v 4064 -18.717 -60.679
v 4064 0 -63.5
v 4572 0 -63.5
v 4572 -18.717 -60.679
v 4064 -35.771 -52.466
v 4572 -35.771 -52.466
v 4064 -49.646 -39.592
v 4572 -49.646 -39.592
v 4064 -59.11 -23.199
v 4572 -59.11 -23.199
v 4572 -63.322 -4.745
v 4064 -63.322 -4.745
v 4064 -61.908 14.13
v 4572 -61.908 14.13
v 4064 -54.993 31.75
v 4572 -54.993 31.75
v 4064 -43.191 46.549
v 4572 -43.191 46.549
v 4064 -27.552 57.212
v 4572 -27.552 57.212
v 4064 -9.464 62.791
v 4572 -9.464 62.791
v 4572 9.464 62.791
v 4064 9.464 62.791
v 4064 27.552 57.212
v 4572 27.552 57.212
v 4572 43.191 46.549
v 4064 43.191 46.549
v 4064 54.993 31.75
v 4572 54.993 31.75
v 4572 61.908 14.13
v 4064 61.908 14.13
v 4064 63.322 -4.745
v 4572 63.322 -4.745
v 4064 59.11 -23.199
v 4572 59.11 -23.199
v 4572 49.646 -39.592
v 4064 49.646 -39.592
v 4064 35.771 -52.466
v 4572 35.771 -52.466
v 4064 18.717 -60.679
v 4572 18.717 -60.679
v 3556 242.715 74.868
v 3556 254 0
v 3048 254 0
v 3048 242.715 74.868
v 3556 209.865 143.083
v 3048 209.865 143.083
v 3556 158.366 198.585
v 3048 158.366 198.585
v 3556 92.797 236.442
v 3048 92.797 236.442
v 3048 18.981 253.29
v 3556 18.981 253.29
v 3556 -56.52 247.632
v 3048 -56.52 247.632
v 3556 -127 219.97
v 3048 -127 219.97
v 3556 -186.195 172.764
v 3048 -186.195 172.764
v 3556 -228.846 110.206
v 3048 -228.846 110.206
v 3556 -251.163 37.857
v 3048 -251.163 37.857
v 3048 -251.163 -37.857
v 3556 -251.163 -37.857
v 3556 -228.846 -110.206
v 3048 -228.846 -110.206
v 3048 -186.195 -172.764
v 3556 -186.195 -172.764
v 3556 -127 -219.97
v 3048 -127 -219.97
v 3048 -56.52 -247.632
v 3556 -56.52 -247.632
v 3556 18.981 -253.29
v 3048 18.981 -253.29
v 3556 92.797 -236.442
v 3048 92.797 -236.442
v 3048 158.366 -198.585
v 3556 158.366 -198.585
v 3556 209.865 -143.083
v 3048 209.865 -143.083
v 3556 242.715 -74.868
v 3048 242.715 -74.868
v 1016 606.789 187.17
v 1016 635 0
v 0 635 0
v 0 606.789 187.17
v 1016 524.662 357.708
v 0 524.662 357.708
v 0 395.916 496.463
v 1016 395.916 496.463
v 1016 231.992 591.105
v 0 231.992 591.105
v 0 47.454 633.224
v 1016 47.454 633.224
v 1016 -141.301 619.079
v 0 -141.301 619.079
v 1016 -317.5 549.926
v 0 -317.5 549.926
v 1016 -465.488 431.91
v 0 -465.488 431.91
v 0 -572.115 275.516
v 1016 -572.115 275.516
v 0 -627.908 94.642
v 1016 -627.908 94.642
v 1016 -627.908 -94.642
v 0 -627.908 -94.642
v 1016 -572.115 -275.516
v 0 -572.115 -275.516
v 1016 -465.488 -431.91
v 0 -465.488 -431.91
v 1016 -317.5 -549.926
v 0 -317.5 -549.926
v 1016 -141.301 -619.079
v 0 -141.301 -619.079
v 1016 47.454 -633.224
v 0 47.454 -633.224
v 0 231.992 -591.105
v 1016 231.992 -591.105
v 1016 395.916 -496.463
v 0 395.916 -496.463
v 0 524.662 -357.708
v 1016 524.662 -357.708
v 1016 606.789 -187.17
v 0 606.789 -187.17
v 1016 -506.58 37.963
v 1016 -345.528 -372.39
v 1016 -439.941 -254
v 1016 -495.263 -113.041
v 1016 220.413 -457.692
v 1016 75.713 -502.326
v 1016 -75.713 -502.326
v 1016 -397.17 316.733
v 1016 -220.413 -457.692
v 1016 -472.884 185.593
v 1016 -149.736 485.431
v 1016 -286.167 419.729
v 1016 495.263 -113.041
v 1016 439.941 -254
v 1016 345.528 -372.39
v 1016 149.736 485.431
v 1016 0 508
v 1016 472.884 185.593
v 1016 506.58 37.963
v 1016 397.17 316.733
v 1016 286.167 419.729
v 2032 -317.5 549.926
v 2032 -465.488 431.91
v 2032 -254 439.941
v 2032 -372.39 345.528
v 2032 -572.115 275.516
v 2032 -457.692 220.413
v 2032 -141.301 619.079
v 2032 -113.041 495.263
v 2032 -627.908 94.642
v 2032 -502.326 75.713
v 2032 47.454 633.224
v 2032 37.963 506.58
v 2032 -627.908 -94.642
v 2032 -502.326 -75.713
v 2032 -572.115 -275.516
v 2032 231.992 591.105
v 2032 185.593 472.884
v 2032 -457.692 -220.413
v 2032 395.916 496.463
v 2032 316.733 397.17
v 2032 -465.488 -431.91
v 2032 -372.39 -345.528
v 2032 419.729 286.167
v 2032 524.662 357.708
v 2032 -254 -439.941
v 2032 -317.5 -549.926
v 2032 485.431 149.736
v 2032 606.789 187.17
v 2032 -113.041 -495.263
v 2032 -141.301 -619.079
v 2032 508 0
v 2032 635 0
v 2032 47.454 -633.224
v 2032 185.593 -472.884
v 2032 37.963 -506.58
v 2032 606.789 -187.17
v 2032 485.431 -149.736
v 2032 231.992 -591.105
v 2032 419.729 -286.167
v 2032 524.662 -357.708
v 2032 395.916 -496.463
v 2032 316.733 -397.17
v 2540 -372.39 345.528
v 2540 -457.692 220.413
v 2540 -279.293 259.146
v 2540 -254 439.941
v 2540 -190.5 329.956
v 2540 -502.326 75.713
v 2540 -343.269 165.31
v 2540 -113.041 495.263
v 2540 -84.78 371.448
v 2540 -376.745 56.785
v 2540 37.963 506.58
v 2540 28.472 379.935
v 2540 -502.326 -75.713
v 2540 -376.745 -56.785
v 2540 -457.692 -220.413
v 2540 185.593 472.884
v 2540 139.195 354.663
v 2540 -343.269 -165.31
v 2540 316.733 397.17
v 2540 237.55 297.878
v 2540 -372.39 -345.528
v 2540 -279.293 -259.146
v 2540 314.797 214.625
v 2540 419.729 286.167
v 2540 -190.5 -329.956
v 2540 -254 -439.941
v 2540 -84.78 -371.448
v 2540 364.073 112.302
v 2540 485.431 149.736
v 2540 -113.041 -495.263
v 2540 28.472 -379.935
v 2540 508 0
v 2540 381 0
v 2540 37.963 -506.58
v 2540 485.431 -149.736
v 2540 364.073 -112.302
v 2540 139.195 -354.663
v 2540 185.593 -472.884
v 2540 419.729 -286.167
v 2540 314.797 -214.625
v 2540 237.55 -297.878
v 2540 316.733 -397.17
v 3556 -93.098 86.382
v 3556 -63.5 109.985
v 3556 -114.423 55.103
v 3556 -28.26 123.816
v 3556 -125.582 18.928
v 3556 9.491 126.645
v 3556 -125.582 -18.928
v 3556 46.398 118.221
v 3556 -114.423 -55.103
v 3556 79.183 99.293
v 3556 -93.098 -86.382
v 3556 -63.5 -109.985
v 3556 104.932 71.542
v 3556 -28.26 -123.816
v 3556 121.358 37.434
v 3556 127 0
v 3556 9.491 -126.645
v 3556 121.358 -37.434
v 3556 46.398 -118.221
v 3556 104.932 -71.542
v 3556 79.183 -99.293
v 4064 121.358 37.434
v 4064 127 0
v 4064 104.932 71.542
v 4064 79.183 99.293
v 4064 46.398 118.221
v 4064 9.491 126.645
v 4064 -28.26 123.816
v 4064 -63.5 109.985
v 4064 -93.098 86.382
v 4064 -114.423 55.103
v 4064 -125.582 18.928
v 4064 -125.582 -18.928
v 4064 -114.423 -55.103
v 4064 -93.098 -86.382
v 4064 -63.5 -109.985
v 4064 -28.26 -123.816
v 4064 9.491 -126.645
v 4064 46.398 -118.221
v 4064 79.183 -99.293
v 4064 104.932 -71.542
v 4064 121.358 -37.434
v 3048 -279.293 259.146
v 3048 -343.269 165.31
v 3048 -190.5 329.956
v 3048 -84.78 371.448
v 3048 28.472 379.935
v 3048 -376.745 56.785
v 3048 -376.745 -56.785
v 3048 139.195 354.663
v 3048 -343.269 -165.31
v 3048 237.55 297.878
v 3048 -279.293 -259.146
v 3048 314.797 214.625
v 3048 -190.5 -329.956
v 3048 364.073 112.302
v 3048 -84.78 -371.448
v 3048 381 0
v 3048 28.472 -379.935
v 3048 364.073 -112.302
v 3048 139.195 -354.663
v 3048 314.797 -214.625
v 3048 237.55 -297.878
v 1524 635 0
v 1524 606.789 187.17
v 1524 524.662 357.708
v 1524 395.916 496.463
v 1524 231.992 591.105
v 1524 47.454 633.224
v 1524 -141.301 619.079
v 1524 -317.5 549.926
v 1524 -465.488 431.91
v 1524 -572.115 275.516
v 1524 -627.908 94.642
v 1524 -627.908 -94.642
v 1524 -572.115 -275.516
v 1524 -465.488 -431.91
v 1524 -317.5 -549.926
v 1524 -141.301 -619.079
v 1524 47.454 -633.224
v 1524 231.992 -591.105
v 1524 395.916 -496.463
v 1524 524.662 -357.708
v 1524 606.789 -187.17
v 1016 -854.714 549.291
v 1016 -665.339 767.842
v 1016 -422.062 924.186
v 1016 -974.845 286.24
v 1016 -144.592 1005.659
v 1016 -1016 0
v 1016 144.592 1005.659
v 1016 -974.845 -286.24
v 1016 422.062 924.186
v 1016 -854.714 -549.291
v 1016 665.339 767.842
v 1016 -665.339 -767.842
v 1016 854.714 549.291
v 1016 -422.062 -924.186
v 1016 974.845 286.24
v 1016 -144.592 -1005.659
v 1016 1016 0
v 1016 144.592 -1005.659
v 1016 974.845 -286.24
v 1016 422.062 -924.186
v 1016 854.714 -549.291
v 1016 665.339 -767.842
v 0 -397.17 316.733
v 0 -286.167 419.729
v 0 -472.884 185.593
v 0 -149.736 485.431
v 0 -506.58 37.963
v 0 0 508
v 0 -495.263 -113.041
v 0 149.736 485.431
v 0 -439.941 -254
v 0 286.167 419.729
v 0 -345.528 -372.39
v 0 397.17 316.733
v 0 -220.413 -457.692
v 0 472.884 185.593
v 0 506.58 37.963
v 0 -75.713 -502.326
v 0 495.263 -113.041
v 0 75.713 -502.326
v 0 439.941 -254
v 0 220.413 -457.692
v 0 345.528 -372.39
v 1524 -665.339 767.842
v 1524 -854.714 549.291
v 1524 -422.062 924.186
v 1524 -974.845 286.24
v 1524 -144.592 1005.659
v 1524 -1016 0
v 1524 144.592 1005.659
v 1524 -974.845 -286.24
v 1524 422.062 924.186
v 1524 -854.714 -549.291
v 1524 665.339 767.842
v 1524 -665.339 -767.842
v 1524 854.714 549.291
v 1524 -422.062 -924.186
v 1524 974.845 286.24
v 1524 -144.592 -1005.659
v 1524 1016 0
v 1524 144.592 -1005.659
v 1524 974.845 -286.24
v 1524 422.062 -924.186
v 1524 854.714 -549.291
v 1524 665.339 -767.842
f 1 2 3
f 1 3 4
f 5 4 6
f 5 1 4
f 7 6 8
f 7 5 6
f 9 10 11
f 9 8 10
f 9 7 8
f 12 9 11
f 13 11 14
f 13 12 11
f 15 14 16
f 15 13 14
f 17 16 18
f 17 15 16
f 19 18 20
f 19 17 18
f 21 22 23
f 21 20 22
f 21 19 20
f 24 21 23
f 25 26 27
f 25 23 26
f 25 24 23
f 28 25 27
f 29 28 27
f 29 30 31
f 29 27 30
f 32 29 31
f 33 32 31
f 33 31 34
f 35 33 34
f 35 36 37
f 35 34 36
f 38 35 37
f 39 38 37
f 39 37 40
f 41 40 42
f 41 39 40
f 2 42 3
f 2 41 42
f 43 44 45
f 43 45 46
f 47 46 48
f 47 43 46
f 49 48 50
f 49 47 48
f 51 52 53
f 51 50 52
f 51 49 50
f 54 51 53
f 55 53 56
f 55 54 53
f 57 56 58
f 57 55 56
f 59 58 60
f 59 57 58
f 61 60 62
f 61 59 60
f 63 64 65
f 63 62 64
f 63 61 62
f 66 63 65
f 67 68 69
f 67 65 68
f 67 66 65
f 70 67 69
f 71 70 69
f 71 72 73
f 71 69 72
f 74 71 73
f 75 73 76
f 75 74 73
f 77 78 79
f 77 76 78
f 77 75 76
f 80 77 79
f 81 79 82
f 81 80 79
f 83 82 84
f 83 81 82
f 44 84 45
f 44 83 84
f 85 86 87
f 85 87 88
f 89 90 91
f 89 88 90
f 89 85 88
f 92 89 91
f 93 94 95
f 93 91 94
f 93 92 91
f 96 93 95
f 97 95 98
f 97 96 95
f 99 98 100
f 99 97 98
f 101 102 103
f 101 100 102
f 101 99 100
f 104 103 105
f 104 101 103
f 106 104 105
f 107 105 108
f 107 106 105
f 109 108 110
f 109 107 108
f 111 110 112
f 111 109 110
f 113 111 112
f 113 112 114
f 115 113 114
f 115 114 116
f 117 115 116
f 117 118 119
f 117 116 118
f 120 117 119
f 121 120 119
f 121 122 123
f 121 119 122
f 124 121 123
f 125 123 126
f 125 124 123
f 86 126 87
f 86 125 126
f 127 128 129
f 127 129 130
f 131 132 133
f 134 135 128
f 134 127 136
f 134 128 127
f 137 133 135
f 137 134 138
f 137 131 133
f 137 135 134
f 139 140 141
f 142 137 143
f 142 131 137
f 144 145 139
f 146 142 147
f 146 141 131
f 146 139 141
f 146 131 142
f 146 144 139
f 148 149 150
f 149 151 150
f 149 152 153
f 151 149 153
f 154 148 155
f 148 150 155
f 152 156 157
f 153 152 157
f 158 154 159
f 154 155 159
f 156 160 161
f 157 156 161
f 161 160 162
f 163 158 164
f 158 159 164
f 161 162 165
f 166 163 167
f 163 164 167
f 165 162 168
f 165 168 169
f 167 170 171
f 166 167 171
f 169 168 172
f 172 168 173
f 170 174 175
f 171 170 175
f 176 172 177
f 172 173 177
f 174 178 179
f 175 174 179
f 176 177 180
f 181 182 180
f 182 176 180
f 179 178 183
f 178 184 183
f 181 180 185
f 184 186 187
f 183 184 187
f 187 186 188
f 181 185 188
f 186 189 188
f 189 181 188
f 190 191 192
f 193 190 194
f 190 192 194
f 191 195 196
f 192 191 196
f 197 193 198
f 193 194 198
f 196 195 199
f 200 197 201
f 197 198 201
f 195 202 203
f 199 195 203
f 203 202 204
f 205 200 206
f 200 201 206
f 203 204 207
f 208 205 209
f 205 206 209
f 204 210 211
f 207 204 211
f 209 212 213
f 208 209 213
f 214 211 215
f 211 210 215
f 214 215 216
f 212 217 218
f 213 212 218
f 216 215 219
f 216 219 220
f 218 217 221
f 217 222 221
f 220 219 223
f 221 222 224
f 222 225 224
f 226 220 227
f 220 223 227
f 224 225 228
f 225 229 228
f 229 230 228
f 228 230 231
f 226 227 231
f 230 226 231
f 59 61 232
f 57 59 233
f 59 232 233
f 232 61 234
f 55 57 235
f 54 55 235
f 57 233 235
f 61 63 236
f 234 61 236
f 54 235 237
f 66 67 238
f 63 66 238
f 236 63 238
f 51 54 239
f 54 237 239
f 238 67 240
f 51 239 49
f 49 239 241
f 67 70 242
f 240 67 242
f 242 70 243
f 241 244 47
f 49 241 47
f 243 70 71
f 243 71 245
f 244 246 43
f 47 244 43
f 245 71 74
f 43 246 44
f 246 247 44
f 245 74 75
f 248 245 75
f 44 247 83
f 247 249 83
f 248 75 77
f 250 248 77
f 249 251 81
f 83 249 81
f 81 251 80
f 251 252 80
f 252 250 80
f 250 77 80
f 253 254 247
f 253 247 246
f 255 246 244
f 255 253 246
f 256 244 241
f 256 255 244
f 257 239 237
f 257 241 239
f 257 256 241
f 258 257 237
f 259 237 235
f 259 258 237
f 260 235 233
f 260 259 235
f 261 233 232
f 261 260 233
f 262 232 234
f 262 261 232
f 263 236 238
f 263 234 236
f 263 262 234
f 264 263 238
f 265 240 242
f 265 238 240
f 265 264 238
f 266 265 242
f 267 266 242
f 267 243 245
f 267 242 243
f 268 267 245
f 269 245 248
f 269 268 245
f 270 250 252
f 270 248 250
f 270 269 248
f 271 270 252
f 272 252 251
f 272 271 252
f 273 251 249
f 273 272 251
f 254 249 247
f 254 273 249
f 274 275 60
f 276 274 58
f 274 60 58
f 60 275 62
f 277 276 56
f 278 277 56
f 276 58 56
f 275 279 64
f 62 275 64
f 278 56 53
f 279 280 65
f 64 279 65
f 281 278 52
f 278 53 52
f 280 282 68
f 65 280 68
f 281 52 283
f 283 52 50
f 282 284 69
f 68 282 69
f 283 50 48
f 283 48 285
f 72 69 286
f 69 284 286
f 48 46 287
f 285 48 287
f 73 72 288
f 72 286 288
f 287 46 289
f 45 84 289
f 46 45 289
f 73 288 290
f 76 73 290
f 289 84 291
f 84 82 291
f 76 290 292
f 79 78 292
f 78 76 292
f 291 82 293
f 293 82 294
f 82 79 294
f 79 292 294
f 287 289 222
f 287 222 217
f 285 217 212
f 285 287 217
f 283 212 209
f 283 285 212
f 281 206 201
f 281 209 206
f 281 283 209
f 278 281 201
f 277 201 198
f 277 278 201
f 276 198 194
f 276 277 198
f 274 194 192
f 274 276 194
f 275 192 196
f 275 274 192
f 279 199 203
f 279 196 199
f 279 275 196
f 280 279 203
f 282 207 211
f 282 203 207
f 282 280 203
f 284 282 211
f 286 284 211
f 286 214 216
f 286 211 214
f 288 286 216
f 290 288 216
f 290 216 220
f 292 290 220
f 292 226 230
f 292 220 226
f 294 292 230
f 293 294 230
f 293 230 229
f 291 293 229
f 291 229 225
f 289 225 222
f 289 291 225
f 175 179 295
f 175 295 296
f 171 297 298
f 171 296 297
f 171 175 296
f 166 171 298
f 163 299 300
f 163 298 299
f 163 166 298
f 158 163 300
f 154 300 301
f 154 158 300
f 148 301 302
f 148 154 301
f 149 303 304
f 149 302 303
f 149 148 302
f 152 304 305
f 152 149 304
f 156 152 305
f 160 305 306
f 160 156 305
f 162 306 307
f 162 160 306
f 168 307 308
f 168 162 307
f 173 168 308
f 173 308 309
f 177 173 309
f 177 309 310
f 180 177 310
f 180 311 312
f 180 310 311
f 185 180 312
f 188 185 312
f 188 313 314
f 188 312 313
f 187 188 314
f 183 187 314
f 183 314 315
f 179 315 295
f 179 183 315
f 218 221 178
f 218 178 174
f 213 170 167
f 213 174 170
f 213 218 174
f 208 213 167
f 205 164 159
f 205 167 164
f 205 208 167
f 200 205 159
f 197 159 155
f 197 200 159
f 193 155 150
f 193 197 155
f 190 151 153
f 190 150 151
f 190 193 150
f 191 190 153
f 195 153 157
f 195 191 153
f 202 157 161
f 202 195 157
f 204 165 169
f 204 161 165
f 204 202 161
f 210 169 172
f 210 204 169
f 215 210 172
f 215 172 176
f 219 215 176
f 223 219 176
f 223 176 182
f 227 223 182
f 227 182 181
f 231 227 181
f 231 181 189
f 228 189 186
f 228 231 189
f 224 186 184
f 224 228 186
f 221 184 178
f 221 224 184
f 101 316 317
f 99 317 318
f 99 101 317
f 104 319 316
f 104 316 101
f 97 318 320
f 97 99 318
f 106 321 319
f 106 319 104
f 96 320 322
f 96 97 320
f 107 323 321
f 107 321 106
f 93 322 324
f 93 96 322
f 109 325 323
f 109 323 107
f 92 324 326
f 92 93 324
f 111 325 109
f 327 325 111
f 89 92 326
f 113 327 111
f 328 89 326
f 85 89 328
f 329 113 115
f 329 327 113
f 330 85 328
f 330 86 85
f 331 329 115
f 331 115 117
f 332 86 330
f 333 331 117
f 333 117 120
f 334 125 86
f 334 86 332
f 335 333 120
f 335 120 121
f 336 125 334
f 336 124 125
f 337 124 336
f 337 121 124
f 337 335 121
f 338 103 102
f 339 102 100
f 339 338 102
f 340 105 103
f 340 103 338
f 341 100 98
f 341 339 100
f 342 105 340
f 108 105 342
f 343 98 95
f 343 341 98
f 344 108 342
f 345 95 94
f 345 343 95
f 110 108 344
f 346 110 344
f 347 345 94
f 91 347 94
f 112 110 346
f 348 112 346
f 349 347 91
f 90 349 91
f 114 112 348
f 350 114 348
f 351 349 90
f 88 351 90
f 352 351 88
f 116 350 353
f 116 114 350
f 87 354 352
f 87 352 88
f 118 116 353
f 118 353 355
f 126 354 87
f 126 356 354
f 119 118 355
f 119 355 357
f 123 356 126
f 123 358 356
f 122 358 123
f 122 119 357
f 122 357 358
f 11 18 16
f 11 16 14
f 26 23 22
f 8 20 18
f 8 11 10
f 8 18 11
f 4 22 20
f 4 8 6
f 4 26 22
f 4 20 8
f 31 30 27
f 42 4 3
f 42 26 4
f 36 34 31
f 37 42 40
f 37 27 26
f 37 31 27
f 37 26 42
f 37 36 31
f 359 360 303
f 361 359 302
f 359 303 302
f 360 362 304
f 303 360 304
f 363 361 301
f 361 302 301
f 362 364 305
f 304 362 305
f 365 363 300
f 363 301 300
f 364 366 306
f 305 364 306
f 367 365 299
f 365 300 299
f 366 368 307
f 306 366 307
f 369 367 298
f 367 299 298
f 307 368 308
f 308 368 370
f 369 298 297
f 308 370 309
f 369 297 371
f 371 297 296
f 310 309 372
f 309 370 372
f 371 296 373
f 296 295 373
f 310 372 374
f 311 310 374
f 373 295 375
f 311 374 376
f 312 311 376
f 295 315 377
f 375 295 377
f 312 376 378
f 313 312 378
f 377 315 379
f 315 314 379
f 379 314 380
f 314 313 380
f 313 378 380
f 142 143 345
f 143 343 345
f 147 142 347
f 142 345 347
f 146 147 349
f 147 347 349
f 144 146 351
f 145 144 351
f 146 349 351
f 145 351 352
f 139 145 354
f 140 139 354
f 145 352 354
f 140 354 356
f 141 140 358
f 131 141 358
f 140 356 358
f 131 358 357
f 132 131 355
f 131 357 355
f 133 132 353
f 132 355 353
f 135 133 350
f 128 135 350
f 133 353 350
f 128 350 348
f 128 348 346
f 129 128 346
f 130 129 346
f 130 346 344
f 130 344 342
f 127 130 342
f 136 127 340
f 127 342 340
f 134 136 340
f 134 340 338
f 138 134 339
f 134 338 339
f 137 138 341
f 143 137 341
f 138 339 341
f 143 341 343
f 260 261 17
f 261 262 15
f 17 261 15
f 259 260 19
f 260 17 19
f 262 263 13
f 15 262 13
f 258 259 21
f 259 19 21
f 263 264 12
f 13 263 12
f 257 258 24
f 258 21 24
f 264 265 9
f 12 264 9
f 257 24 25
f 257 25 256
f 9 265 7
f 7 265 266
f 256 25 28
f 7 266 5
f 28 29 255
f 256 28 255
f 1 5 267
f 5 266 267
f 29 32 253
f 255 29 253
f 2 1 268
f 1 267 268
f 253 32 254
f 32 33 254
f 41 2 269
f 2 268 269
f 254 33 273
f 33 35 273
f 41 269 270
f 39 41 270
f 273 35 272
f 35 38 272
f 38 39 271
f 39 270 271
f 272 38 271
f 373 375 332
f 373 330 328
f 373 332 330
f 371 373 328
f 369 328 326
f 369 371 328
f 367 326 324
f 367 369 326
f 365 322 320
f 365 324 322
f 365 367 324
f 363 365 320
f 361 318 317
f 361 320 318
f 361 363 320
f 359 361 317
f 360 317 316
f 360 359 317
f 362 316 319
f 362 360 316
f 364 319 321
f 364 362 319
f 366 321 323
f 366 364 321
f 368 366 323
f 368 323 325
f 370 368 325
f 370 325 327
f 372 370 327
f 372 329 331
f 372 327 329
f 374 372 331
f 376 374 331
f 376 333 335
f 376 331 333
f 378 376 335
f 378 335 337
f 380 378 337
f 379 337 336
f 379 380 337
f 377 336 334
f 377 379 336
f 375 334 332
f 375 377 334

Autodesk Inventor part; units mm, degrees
ref_plane "YZ Plane" through (0, 0, 0) normal (1, 0, 0) x (0, 1, 0)
ref_plane "XZ Plane" through (0, 0, 0) normal (0, 1, 0) x (-1, 0, 0)
ref_plane "XY Plane" through (0, 0, 0) normal (0, 0, 1) x (1, 0, 0)
sketch "草圖1" plane through (0, 0, 0) normal (0, 0, 1) x (1, 0, 0)
  line L0 (0, 0) -> (0, 635)
  line L1 (0, 635) -> (1016, 635)
  line L2 (1016, 635) -> (1016, 1016)
  line L3 (1016, 1016) -> (1524, 1016)
  line L4 (1524, 1016) -> (1524, 635)
  line L5 (1524, 635) -> (2032, 635)
  line L6 (2032, 635) -> (2032, 508)
  line L7 (2032, 508) -> (2540, 508)
  line L8 (2540, 508) -> (2540, 381)
  line L9 (2540, 381) -> (3048, 381)
  line L10 (3048, 381) -> (3048, 254)
  line L11 (3048, 254) -> (3556, 254)
  line L12 (3556, 254) -> (3556, 127)
  line L13 (3556, 0) -> (0, 0)
  line L14 (3556, 254) -> (3556, 127)
  line L15 (3556, 127) -> (4064, 127)
  line L16 (4064, 127) -> (4064, 0)
  line L17 (4064, 0) -> (3556, 0)
  dimension "d0" = 635
  dimension "d1" = 1016
  dimension "d2" = 381
  dimension "d3" = 508
  dimension "d4" = 508
  dimension "d5" = 127
  dimension "d6" = 508
  dimension "d7" = 127
  dimension "d8" = 508
  dimension "d9" = 127
  dimension "d10" = 508
  dimension "d11" = 127
  dimension "d12" = 508
revolve "迴轉1" add sketch "草圖1" angle 360 about axis through (3556, 0, 0) along (-1, 0, 0)
sketch "草圖2" plane through (0, 0, 0) normal (-1, 0, 0) x (0, 0, 1)
  circle A0 centre (0, 0) radius 127 projected
  circle A1 centre (0, 0) radius 508
  dimension "d14" = 1016
extrude "擠出1" cut sketch "草圖2" against normal blind 1016 contours A0 | A1
sketch "草圖3" plane through (4064, 0, 0) normal (1, 0, 0) x (0, 0, -1)
  circle A0 centre (0, 0) radius 127 projected
  circle A1 centre (0, 0) radius 63.5
  dimension "d17" = 127
extrude "擠出2" add sketch "草圖3" along normal blind 508 contours A1
